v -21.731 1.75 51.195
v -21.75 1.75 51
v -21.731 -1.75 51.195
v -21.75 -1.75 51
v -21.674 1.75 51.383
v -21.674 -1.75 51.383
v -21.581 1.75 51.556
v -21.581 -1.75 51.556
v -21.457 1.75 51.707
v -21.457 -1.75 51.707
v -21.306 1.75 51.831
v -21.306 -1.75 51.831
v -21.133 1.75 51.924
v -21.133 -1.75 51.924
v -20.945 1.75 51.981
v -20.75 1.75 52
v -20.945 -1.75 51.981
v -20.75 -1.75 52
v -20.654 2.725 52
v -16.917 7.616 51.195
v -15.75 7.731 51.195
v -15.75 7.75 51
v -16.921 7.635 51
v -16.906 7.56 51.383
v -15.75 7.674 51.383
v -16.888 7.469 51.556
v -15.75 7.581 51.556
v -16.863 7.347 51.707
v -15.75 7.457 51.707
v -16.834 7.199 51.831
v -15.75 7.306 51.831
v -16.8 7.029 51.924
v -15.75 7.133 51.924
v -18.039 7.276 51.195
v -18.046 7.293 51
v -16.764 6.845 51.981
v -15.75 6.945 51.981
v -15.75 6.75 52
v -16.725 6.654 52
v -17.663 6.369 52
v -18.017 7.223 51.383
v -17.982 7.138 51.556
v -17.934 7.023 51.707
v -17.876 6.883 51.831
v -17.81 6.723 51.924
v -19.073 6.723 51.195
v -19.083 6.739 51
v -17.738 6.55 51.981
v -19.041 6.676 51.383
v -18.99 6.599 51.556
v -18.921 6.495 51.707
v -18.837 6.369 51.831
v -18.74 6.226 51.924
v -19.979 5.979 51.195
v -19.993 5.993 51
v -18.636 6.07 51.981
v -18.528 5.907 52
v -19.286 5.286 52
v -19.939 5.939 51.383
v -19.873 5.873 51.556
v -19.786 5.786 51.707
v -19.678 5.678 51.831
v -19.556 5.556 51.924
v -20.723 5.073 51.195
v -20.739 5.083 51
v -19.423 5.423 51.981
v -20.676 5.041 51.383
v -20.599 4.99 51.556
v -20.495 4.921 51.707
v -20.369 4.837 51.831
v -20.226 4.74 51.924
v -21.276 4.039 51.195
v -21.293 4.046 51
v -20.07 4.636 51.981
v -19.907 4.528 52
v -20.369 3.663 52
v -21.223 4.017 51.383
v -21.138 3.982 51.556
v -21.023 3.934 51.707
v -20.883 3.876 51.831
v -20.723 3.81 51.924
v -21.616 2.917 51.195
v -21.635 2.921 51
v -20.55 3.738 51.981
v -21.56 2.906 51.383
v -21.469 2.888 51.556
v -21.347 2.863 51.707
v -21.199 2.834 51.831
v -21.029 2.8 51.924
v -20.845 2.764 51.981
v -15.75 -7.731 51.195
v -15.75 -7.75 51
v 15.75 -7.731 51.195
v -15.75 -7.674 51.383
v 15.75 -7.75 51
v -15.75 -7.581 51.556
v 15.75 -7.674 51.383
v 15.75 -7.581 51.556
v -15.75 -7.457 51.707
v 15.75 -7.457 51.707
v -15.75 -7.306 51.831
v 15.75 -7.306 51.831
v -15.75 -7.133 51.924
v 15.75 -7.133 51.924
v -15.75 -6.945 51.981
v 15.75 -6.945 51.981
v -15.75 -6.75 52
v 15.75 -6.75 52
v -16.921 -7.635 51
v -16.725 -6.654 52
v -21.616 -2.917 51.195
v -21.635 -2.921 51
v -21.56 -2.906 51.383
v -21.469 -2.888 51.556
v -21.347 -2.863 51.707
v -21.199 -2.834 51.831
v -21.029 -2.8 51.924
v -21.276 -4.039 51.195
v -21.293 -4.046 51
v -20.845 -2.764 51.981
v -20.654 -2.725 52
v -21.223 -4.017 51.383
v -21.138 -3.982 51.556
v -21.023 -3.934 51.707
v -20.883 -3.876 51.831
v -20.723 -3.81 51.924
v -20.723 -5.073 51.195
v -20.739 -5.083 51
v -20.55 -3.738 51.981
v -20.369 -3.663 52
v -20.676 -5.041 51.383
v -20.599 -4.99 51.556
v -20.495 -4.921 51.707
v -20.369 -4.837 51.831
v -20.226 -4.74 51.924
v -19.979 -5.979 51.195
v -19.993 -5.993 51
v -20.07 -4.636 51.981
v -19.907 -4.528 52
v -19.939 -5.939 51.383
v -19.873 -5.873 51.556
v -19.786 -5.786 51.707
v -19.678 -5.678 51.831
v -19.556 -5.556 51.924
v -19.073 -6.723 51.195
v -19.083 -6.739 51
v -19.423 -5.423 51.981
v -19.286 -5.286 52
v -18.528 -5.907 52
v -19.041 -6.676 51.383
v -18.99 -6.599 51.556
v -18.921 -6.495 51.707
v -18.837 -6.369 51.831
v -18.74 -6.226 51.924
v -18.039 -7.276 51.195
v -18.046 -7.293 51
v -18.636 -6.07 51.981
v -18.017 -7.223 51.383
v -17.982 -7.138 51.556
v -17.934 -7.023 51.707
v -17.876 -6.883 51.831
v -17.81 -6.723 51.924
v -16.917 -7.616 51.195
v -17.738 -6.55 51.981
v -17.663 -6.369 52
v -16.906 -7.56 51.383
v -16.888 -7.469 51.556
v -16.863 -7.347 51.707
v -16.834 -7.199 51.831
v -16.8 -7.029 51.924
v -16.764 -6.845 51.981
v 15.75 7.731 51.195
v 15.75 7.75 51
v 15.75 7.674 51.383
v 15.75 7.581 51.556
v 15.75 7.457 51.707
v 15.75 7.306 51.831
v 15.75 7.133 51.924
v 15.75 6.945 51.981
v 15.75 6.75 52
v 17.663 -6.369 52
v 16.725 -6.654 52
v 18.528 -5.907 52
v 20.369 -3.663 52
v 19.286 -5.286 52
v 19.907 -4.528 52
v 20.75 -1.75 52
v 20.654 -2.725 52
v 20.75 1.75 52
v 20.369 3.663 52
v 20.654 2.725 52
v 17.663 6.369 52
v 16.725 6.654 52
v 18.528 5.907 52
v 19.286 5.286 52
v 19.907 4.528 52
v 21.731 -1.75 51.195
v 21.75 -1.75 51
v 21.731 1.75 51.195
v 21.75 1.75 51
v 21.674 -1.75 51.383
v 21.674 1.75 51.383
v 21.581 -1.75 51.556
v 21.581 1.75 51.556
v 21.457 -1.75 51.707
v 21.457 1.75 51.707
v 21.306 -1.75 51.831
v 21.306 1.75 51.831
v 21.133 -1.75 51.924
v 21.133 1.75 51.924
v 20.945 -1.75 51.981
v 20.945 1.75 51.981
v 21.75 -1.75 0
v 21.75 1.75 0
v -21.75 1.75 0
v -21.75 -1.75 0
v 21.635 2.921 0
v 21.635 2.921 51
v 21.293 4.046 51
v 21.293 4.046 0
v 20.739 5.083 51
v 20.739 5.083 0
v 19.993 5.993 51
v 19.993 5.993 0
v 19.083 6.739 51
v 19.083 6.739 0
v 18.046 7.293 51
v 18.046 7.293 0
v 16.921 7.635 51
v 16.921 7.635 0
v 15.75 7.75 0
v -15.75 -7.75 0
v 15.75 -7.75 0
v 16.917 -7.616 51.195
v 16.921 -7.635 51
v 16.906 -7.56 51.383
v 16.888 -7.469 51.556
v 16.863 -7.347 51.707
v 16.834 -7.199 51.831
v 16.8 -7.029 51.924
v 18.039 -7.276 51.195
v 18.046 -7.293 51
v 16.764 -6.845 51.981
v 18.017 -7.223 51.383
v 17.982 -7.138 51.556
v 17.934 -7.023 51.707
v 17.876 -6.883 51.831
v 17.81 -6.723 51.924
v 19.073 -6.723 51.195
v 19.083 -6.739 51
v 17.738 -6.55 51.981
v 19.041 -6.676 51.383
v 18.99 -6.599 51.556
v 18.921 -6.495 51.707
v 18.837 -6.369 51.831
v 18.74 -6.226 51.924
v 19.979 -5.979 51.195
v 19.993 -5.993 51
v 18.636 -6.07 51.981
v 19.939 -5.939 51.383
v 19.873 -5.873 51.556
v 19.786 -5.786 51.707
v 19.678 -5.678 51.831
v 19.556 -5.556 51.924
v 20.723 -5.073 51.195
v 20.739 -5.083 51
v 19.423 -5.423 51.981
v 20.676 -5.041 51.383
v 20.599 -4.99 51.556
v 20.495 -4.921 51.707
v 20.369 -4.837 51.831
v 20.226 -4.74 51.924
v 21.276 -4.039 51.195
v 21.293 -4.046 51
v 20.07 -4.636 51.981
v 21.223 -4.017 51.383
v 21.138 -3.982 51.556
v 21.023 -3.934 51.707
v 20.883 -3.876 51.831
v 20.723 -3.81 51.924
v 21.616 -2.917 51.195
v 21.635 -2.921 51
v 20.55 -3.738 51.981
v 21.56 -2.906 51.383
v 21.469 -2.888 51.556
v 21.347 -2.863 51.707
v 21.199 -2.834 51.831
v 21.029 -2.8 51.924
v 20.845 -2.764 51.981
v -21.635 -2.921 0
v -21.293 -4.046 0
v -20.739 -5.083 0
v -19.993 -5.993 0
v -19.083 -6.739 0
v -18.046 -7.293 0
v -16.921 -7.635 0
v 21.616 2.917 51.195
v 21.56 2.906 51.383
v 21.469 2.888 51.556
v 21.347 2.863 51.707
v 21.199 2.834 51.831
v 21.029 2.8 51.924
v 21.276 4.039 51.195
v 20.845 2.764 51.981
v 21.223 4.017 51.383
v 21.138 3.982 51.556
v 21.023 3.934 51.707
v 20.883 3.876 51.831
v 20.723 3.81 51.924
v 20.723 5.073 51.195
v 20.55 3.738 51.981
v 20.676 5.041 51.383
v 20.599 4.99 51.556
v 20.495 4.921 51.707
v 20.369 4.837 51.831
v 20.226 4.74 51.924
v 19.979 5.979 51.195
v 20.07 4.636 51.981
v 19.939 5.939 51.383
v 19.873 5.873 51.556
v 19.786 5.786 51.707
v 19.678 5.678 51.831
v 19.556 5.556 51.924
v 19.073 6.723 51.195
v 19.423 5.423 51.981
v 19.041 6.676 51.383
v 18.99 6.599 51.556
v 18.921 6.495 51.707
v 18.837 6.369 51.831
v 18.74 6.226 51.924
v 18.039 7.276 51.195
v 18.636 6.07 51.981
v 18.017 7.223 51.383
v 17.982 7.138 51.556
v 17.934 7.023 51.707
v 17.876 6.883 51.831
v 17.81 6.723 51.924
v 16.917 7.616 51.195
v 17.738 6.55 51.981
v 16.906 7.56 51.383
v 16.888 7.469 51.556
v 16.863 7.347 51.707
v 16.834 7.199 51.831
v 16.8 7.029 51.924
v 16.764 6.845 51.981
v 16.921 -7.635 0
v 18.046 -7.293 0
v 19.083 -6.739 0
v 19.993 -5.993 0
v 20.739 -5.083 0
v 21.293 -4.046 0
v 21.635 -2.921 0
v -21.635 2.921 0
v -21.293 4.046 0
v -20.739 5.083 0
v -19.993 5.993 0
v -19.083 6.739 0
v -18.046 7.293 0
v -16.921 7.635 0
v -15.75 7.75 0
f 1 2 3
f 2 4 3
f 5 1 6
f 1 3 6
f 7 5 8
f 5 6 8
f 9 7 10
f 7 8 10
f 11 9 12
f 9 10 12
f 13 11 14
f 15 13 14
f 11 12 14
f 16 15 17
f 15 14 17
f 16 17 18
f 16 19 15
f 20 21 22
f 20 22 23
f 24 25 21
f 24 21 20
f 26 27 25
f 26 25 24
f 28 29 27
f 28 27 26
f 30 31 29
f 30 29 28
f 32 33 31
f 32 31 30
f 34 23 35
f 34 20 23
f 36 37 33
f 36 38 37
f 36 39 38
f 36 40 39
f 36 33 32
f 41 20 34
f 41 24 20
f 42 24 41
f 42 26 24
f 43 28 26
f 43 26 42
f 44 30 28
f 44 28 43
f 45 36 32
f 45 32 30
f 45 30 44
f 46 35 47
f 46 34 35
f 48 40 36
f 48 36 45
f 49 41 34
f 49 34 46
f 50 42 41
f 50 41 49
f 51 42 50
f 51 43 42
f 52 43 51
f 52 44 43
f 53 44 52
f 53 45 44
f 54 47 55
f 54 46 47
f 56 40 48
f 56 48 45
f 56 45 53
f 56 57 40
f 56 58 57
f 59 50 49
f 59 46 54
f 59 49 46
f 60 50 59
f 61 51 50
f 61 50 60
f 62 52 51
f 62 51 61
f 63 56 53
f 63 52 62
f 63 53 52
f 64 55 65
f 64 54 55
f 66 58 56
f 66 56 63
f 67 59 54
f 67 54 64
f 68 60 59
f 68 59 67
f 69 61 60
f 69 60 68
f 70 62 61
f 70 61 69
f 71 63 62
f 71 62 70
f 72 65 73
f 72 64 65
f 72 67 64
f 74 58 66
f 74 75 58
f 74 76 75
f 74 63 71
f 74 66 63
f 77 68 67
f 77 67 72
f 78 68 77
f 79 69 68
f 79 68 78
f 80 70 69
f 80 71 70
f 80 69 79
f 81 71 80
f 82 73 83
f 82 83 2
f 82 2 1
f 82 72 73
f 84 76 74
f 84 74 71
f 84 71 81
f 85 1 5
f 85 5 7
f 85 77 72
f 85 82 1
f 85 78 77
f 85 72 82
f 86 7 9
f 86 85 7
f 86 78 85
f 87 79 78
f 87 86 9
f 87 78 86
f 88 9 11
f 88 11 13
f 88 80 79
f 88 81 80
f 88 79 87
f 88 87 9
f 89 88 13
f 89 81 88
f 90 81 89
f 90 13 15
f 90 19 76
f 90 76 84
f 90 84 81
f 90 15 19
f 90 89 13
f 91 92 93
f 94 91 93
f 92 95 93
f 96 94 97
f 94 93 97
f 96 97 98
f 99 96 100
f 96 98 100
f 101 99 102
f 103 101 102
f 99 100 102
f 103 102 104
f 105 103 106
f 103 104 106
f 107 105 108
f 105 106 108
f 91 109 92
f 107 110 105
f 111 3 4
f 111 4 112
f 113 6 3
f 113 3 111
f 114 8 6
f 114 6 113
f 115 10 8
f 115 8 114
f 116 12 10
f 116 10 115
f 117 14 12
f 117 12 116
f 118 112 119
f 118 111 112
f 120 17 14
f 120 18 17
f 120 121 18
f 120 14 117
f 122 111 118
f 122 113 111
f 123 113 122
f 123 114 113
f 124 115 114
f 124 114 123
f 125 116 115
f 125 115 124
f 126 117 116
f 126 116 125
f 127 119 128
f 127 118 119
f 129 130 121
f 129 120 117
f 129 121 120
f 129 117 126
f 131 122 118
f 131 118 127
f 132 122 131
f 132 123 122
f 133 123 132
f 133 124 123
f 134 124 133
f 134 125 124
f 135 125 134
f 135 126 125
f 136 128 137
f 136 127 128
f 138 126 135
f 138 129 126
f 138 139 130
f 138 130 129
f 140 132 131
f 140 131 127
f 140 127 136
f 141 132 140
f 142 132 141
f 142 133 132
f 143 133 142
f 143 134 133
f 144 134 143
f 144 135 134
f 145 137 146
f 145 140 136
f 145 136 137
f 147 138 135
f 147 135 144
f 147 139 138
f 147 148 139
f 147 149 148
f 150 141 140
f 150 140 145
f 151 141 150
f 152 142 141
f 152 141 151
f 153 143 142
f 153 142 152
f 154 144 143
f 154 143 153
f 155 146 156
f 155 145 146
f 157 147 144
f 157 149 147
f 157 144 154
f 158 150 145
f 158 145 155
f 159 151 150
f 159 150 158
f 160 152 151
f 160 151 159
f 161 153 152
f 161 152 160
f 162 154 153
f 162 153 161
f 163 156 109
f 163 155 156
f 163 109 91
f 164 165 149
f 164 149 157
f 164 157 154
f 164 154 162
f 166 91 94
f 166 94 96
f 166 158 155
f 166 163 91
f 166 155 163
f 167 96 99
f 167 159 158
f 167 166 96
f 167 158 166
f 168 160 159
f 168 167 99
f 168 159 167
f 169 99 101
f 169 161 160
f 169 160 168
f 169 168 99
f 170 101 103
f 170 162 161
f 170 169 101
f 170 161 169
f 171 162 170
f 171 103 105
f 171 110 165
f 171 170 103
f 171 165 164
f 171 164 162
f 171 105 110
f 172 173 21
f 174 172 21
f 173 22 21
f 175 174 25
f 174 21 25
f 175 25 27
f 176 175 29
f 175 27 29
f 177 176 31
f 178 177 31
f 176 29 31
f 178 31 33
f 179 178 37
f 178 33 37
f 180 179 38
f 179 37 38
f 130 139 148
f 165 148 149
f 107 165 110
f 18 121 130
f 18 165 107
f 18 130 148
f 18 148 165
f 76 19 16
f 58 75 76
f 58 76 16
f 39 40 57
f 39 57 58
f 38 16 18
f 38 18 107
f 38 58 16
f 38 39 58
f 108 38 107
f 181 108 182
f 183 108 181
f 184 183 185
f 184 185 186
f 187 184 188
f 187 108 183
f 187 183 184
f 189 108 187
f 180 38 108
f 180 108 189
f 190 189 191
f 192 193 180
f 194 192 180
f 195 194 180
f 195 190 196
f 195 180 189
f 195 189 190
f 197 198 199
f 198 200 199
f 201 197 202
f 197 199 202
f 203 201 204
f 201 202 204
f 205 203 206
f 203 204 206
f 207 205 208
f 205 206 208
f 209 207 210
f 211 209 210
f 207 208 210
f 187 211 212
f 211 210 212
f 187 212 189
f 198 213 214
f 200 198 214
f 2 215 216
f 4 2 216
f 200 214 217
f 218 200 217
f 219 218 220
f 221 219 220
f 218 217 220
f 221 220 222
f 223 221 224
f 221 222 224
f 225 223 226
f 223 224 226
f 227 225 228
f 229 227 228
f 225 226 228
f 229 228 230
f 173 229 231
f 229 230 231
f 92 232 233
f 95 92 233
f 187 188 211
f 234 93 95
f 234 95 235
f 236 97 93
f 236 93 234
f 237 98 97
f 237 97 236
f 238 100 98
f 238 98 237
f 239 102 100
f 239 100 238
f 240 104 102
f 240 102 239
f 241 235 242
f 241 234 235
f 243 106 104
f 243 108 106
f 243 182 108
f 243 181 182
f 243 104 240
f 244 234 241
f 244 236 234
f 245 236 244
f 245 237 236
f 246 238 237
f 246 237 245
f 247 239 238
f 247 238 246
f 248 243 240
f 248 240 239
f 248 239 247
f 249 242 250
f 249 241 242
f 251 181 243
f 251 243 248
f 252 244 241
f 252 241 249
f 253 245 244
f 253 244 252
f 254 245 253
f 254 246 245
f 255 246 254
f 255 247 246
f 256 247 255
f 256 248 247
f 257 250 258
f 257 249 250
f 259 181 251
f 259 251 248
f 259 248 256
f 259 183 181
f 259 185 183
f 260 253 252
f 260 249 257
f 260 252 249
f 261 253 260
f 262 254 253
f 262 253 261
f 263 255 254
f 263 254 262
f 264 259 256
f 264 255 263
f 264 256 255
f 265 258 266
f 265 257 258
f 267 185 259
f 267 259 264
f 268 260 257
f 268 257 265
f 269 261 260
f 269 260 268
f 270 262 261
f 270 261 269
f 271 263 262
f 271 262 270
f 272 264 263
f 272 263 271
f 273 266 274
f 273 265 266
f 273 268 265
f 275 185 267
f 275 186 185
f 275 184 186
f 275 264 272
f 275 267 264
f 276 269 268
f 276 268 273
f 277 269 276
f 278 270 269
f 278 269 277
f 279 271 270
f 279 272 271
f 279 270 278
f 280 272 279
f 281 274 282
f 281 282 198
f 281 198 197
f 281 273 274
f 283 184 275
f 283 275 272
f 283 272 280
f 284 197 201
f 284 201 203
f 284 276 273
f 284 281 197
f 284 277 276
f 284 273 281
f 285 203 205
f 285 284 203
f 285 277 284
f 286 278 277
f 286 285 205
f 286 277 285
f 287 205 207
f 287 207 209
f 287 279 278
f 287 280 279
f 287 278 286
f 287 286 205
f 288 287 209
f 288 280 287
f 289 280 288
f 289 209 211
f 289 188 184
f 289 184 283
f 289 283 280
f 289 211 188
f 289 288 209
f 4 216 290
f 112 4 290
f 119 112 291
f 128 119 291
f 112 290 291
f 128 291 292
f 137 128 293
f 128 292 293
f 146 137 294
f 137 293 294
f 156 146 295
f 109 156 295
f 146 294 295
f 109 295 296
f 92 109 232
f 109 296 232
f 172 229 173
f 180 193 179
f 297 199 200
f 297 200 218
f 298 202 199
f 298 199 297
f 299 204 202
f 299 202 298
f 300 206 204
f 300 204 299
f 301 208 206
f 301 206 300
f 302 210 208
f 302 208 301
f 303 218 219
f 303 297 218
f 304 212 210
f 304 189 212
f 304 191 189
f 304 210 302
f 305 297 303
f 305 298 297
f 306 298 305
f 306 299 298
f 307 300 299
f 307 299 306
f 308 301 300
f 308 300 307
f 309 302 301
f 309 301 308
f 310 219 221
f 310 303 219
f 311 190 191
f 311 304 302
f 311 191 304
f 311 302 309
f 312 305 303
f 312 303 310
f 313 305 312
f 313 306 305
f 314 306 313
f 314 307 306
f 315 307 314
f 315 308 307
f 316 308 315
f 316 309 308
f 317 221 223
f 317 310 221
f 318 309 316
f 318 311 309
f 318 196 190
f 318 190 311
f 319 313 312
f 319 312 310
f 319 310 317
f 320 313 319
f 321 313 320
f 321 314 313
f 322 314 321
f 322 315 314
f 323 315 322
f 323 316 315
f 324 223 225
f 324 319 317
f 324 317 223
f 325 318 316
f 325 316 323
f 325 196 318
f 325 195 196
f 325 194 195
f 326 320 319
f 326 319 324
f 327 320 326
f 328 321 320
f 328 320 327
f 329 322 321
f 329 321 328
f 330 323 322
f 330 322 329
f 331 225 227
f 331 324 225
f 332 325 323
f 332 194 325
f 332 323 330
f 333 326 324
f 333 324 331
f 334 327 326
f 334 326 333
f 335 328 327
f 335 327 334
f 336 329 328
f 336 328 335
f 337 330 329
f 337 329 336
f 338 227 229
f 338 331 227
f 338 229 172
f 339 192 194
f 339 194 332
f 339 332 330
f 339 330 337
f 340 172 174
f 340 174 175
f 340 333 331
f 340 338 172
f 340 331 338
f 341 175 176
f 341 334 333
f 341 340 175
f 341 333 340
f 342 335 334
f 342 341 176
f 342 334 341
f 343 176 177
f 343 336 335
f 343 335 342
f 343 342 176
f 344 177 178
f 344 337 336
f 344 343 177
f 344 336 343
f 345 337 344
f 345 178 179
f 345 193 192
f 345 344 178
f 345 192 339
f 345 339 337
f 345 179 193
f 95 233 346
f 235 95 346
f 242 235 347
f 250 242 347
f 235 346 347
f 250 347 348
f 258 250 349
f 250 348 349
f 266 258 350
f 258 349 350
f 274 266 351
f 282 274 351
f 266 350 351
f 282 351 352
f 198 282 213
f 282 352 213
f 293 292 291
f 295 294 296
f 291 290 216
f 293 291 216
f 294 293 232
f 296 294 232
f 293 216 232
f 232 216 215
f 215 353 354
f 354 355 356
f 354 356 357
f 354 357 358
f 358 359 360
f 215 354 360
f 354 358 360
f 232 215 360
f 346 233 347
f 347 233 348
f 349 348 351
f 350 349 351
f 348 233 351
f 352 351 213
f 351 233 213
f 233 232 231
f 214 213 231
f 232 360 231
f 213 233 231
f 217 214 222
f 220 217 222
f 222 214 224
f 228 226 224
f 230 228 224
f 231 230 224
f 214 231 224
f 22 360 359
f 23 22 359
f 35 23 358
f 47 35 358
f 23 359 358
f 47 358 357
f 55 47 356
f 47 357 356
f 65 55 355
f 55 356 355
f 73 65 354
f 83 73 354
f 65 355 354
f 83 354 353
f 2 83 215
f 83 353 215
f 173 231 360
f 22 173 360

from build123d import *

# Parameters (mm, degrees)
BOSS_EXTRUDE1_DEPTH = 52
FILLET1_R           = 1


with BuildPart() as part:
    # Sketch2 → Boss-Extrude1 (new body)
    with BuildSketch(Plane.XY):
        with BuildLine():
            Line((-15.75, -7.75), (15.75, -7.75))
            ThreePointArc((15.75, -7.75), (19.992640687, -5.992640687), (21.75, -1.75))
            Line((21.75, -1.75), (21.75, 1.75))
            ThreePointArc((21.75, 1.75), (19.992640687, 5.992640687), (15.75, 7.75))
            Line((15.75, 7.75), (-15.75, 7.75))
            ThreePointArc((-15.75, 7.75), (-19.992640687, 5.992640687), (-21.75, 1.75))
            Line((-21.75, 1.75), (-21.75, -1.75))
            ThreePointArc((-21.75, -1.75), (-19.992640687, -5.992640687), (-15.75, -7.75))
        make_face()
    extrude(amount=BOSS_EXTRUDE1_DEPTH)

    # Fillet1
    fillet1_edges = [part.edges().sort_by_distance(p)[0] for p in [
        (-19.992640687, 5.992640687, 52),
        (-21.75, 0, 52),
        (-19.992640687, -5.992640687, 52),
        (0, -7.75, 52),
        (19.992640687, -5.992640687, 52),
        (21.75, 0, 52),
        (19.992640687, 5.992640687, 52),
        (0, 7.75, 52),
    ]]
    fillet(fillet1_edges, radius=FILLET1_R)


solid = part.part
